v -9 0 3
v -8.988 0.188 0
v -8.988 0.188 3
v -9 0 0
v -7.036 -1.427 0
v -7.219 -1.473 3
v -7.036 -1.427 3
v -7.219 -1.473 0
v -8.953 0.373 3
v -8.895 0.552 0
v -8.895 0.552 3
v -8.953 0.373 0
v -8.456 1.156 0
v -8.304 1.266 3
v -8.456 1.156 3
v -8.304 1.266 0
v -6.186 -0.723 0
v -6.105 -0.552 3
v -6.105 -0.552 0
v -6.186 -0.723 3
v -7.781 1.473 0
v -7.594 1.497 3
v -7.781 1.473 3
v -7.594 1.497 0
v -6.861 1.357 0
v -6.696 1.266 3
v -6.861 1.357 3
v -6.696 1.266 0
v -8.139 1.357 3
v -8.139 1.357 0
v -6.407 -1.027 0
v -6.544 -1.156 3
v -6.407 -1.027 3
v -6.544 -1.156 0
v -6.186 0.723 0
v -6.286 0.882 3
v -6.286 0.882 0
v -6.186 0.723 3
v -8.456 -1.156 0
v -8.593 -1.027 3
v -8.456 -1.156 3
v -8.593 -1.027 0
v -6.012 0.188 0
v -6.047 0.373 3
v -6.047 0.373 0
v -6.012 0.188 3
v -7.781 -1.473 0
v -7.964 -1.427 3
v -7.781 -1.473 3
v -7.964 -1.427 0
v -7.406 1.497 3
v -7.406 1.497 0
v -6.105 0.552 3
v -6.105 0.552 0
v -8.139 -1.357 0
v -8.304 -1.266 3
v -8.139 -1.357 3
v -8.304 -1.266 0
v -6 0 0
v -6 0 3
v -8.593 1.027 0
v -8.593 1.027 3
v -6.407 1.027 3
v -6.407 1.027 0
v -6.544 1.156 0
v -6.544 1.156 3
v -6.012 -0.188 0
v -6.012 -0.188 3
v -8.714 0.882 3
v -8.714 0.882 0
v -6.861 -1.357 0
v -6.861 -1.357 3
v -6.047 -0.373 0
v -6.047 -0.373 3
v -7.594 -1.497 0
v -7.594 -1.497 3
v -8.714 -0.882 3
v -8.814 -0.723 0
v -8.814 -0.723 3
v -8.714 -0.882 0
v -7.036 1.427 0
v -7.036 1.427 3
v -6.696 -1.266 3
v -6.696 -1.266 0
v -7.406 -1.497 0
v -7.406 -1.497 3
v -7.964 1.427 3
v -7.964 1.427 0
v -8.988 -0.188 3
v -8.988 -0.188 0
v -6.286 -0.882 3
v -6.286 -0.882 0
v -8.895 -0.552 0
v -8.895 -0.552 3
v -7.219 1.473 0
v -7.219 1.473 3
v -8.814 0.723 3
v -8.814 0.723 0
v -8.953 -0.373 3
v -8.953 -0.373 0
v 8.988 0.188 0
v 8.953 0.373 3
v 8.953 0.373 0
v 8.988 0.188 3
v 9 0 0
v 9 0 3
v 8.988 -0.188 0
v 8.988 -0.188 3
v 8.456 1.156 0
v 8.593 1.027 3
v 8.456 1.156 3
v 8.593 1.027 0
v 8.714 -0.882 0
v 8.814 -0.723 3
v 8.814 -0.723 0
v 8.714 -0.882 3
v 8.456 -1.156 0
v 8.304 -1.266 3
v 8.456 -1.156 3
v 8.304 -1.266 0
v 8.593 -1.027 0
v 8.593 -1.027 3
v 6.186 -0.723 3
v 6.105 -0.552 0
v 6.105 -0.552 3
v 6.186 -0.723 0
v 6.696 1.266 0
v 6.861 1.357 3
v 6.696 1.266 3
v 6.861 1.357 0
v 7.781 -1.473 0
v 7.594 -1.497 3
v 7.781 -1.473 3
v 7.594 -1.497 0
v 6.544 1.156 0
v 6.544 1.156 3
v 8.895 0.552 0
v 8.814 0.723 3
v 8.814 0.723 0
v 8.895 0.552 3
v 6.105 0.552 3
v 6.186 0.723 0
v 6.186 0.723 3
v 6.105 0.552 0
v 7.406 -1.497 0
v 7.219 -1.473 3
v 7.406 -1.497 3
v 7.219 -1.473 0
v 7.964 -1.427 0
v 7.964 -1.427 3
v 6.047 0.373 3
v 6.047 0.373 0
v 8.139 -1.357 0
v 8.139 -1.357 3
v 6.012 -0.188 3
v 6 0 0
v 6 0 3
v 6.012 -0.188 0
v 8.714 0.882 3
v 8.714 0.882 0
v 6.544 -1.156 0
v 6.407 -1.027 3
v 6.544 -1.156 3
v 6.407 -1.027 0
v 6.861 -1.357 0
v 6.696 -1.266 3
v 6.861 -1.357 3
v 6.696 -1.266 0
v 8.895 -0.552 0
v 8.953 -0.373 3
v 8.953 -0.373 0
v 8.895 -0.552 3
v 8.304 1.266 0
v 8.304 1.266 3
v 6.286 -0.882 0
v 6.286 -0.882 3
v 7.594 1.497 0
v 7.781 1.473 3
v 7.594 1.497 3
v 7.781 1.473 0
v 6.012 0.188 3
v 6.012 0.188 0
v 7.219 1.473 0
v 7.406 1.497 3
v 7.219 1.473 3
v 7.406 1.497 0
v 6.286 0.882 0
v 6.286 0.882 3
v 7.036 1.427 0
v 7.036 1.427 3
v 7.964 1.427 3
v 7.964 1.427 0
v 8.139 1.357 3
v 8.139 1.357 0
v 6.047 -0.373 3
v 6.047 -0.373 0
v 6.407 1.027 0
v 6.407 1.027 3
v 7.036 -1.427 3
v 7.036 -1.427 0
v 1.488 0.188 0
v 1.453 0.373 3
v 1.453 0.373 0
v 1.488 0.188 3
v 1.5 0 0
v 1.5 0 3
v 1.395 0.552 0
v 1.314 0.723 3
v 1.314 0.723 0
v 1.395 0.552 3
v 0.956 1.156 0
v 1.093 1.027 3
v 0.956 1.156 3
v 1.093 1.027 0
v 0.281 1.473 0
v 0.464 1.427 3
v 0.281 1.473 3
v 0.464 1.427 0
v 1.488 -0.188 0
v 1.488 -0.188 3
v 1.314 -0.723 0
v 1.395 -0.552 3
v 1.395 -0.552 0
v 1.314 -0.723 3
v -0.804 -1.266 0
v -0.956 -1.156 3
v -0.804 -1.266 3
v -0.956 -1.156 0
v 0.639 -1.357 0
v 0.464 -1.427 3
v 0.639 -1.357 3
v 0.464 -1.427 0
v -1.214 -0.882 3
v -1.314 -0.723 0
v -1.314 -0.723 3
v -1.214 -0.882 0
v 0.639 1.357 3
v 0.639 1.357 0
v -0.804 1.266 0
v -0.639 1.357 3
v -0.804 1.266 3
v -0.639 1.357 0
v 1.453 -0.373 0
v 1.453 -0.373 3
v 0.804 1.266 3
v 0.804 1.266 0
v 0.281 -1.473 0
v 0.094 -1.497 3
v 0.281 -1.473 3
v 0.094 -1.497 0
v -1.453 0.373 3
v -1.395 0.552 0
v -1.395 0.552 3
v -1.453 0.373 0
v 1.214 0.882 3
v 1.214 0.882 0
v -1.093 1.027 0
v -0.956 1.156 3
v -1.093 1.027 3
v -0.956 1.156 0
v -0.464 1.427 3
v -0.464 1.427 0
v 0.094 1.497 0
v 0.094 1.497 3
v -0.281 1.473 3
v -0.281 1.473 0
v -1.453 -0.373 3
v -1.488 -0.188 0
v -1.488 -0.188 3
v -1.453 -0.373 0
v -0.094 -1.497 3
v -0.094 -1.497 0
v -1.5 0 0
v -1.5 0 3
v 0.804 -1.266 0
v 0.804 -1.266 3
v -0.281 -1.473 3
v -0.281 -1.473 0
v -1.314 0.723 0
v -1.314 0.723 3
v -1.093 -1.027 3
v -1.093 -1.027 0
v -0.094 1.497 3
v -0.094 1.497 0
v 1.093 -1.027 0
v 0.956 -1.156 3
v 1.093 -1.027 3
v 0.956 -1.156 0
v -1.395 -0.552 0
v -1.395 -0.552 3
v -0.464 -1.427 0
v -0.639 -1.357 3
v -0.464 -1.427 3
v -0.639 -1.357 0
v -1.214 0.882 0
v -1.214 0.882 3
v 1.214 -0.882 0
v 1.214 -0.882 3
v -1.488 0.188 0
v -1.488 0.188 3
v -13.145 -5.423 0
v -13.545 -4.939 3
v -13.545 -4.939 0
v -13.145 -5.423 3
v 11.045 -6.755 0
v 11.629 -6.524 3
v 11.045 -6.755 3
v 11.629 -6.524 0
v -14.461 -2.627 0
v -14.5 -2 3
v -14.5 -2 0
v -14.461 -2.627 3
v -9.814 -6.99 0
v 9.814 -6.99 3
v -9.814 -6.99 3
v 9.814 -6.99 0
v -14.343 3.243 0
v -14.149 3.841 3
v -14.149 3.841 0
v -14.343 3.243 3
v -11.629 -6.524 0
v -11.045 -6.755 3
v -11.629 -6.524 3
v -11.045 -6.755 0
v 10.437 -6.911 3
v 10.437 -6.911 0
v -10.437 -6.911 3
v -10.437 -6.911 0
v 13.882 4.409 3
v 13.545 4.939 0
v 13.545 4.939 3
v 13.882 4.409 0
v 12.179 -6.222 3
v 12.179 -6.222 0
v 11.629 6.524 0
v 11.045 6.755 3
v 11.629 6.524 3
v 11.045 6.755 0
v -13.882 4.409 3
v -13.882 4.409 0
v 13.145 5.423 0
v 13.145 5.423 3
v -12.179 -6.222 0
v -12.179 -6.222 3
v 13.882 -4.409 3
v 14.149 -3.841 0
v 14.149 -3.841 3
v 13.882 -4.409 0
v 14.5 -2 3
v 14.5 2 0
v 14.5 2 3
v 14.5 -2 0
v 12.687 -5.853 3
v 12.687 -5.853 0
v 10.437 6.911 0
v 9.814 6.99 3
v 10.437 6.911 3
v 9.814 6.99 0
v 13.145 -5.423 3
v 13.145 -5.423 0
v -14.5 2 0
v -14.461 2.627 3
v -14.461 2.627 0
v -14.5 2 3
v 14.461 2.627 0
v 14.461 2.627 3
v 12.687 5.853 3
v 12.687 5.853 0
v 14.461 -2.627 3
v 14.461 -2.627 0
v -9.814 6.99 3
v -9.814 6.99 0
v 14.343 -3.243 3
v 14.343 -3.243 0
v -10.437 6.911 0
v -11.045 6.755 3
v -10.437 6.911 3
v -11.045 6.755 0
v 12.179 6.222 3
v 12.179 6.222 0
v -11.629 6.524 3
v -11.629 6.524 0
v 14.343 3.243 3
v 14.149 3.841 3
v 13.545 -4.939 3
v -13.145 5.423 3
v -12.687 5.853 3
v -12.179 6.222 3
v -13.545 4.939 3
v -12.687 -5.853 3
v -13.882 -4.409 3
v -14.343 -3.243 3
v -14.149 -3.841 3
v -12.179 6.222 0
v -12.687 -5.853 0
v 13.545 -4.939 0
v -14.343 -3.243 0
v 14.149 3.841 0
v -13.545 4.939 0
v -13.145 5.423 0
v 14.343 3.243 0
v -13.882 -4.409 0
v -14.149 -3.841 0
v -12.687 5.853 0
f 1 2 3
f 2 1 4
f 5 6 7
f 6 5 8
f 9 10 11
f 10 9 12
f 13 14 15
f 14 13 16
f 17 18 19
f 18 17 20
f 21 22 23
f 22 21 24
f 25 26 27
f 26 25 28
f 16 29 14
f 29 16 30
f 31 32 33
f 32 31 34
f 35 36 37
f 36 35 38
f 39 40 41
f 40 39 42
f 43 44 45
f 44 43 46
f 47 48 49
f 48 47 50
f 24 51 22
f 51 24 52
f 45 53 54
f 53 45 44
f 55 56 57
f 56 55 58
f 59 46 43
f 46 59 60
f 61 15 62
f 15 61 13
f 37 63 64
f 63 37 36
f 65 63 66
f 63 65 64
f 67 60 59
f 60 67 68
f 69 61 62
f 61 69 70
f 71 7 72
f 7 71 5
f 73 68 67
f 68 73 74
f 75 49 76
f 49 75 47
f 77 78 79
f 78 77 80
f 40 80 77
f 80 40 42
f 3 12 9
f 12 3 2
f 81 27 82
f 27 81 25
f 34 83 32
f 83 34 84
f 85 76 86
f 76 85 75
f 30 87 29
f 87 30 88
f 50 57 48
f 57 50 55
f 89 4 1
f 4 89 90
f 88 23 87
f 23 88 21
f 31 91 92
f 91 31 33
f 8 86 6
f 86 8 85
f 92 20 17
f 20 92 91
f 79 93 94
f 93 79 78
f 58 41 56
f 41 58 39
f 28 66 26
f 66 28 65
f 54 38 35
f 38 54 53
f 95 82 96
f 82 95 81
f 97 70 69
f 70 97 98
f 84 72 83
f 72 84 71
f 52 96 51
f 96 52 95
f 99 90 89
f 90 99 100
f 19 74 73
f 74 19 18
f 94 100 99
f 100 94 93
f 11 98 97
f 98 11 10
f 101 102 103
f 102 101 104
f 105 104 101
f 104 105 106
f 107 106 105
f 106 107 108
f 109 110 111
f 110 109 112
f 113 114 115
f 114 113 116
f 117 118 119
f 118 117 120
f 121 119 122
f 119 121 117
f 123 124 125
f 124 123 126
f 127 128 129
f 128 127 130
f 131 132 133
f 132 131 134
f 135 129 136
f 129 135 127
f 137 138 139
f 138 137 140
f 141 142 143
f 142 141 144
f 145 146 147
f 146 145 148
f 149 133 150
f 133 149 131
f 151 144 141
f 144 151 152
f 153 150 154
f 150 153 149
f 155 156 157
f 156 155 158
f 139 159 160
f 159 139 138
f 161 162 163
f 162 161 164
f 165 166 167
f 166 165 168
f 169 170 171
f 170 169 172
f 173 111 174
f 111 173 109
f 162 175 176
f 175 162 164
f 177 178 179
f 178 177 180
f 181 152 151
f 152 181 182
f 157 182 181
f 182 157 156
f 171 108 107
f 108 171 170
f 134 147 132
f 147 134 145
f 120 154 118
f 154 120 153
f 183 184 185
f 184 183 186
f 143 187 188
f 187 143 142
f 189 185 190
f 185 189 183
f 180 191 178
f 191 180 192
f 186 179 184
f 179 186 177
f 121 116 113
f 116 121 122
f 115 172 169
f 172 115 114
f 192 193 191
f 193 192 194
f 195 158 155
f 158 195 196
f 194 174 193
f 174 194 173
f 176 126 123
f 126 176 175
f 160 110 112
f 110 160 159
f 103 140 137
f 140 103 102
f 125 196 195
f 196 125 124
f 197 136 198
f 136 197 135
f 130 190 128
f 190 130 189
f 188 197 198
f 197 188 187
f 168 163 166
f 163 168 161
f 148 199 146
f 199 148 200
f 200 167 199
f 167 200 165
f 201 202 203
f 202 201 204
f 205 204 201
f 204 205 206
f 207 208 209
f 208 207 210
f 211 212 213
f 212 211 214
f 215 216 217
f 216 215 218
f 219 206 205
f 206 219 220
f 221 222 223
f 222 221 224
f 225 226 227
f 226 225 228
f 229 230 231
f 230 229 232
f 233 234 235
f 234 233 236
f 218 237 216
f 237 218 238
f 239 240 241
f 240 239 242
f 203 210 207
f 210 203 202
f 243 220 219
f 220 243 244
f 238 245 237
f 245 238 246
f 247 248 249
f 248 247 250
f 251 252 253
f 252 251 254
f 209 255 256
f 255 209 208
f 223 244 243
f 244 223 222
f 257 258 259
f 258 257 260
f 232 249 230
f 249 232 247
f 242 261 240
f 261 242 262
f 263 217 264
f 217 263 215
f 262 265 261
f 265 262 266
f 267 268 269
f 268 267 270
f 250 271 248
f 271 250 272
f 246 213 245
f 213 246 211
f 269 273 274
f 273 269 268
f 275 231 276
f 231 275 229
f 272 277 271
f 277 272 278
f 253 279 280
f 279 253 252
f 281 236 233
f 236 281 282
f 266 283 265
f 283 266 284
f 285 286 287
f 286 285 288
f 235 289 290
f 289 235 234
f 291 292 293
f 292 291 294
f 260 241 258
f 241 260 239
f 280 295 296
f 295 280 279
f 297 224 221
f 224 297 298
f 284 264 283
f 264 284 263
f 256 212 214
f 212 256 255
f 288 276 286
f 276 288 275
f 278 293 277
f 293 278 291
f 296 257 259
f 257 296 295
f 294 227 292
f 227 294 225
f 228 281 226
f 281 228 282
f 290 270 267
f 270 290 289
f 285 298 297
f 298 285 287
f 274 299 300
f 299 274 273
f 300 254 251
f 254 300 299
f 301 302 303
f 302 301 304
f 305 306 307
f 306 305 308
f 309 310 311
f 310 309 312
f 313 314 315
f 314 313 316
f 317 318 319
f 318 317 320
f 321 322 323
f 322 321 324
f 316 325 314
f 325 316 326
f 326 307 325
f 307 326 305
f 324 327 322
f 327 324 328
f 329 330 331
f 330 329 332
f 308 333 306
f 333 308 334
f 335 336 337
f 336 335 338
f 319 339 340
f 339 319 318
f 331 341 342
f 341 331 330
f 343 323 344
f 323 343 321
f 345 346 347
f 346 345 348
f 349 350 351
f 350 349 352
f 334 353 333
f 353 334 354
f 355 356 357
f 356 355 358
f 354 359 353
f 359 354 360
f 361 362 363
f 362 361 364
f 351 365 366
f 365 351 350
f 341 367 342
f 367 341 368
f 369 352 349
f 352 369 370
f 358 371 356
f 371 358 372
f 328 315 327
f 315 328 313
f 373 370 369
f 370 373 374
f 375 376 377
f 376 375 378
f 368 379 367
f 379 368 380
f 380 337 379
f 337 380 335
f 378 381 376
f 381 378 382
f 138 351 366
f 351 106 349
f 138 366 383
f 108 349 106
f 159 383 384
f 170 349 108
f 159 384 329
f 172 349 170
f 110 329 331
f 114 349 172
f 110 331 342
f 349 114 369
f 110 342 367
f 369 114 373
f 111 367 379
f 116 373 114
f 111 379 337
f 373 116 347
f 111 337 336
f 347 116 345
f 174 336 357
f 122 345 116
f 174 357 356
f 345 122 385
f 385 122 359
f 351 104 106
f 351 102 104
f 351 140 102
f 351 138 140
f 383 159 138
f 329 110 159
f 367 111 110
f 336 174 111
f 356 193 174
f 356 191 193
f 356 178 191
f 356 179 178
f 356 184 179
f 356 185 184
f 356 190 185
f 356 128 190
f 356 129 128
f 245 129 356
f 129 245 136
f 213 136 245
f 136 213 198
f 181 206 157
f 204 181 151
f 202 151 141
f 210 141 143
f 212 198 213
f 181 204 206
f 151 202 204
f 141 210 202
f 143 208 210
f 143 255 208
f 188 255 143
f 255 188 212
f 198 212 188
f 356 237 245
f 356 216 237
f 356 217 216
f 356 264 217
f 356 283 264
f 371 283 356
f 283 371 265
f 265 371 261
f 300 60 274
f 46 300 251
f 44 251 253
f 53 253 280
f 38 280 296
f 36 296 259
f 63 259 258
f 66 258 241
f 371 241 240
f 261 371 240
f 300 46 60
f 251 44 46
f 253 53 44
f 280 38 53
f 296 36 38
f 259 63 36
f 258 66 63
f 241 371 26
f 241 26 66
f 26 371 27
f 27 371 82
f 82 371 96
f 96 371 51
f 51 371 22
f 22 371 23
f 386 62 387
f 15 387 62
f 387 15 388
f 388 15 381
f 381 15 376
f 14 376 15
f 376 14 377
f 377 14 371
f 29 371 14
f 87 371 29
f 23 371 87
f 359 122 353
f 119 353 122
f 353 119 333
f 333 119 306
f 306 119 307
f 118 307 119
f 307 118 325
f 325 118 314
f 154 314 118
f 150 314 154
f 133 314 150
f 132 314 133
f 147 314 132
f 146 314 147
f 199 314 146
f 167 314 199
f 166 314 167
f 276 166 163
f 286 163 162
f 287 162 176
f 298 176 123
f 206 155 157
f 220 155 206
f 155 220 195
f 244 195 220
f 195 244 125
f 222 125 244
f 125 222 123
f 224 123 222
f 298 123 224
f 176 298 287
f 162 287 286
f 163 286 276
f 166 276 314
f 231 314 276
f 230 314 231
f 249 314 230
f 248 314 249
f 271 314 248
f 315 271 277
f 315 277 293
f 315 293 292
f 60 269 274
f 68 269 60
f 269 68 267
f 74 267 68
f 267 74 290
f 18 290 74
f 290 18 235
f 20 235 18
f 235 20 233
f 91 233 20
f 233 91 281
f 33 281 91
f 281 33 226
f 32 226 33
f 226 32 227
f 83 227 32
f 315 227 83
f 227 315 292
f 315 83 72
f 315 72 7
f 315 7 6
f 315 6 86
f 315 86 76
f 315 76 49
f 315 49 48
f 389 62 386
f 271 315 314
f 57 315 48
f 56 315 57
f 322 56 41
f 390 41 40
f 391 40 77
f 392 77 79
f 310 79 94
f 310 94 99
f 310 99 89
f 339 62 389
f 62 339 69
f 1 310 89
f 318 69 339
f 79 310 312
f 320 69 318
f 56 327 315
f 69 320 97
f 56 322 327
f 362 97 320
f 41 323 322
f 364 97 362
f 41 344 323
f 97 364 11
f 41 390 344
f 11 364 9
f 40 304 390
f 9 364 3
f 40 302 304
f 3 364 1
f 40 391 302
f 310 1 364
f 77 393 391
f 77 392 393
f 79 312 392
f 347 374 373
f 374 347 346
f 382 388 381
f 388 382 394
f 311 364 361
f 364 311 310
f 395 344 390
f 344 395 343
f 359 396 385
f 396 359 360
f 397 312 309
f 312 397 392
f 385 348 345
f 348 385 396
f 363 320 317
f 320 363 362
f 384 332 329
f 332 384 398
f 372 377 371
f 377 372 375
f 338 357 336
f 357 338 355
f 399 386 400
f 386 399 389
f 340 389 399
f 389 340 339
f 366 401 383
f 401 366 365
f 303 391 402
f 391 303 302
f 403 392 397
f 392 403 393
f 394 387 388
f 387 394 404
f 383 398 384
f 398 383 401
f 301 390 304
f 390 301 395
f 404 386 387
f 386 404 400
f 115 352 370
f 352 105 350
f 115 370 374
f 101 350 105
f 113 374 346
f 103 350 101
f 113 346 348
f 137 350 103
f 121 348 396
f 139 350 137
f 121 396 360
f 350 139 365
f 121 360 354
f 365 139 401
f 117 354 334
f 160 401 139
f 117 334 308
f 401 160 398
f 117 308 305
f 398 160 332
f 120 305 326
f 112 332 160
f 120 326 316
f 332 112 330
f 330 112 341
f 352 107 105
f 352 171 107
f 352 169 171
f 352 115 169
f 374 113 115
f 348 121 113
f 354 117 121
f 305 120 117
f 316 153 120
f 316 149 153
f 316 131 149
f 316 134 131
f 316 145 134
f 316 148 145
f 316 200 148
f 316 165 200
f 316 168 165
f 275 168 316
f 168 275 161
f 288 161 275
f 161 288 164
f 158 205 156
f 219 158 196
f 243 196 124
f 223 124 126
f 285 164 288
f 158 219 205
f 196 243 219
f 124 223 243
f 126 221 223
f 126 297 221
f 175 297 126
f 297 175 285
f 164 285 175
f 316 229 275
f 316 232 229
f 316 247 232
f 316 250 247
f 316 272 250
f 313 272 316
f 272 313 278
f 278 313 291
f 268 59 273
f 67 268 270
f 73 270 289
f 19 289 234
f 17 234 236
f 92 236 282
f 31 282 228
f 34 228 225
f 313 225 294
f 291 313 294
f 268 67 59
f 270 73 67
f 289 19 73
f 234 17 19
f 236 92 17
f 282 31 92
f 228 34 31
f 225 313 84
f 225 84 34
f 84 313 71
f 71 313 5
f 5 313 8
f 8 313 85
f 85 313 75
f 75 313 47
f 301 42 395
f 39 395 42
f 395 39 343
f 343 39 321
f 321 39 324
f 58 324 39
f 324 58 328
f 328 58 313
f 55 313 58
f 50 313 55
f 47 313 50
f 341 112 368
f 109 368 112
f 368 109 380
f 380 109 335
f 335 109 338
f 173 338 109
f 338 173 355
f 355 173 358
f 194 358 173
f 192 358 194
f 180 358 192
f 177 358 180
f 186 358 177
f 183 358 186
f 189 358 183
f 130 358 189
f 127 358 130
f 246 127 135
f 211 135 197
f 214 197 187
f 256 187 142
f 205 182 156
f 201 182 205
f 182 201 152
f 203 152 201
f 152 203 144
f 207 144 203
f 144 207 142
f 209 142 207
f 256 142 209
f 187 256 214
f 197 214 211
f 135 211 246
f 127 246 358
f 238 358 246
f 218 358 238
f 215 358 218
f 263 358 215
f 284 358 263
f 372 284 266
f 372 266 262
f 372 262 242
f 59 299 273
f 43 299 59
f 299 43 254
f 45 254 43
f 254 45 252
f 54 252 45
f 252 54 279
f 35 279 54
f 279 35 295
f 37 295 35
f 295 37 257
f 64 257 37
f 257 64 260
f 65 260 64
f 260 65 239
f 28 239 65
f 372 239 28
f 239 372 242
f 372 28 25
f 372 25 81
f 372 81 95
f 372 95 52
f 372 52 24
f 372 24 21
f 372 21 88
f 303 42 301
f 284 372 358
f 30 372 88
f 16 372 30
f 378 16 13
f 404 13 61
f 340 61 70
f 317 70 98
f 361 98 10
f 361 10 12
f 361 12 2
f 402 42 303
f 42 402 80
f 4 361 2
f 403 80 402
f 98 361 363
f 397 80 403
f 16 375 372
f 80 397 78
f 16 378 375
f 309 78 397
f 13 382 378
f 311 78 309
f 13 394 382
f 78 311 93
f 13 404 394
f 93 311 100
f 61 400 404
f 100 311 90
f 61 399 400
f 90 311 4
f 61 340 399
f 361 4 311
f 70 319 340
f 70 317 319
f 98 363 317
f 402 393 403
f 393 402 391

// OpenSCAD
$fn = 50;


difference() {
	union() {
		hull() {
			translate(v = [-9.5000000000, 2.0000000000, 0]) {
				cylinder(h = 3, r = 5);
			}
			translate(v = [9.5000000000, 2.0000000000, 0]) {
				cylinder(h = 3, r = 5);
			}
			translate(v = [-9.5000000000, -2.0000000000, 0]) {
				cylinder(h = 3, r = 5);
			}
			translate(v = [9.5000000000, -2.0000000000, 0]) {
				cylinder(h = 3, r = 5);
			}
		}
	}
	union() {
		translate(v = [-7.5000000000, 0.0000000000, 0]) {
			translate(v = [0, 0, -100]) {
				cylinder(h = 200, r = 1.5000000000);
			}
		}
		translate(v = [7.5000000000, 0.0000000000, 0]) {
			translate(v = [0, 0, -100]) {
				cylinder(h = 200, r = 1.5000000000);
			}
		}
		translate(v = [-7.5000000000, 0.0000000000, 0]) {
			translate(v = [0, 0, -100]) {
				cylinder(h = 200, r = 1.5000000000);
			}
		}
		translate(v = [0, 0, -100]) {
			cylinder(h = 200, r = 1.5000000000);
		}
		translate(v = [7.5000000000, 0.0000000000, 0]) {
			translate(v = [0, 0, -100]) {
				cylinder(h = 200, r = 1.5000000000);
			}
		}
	}
}
